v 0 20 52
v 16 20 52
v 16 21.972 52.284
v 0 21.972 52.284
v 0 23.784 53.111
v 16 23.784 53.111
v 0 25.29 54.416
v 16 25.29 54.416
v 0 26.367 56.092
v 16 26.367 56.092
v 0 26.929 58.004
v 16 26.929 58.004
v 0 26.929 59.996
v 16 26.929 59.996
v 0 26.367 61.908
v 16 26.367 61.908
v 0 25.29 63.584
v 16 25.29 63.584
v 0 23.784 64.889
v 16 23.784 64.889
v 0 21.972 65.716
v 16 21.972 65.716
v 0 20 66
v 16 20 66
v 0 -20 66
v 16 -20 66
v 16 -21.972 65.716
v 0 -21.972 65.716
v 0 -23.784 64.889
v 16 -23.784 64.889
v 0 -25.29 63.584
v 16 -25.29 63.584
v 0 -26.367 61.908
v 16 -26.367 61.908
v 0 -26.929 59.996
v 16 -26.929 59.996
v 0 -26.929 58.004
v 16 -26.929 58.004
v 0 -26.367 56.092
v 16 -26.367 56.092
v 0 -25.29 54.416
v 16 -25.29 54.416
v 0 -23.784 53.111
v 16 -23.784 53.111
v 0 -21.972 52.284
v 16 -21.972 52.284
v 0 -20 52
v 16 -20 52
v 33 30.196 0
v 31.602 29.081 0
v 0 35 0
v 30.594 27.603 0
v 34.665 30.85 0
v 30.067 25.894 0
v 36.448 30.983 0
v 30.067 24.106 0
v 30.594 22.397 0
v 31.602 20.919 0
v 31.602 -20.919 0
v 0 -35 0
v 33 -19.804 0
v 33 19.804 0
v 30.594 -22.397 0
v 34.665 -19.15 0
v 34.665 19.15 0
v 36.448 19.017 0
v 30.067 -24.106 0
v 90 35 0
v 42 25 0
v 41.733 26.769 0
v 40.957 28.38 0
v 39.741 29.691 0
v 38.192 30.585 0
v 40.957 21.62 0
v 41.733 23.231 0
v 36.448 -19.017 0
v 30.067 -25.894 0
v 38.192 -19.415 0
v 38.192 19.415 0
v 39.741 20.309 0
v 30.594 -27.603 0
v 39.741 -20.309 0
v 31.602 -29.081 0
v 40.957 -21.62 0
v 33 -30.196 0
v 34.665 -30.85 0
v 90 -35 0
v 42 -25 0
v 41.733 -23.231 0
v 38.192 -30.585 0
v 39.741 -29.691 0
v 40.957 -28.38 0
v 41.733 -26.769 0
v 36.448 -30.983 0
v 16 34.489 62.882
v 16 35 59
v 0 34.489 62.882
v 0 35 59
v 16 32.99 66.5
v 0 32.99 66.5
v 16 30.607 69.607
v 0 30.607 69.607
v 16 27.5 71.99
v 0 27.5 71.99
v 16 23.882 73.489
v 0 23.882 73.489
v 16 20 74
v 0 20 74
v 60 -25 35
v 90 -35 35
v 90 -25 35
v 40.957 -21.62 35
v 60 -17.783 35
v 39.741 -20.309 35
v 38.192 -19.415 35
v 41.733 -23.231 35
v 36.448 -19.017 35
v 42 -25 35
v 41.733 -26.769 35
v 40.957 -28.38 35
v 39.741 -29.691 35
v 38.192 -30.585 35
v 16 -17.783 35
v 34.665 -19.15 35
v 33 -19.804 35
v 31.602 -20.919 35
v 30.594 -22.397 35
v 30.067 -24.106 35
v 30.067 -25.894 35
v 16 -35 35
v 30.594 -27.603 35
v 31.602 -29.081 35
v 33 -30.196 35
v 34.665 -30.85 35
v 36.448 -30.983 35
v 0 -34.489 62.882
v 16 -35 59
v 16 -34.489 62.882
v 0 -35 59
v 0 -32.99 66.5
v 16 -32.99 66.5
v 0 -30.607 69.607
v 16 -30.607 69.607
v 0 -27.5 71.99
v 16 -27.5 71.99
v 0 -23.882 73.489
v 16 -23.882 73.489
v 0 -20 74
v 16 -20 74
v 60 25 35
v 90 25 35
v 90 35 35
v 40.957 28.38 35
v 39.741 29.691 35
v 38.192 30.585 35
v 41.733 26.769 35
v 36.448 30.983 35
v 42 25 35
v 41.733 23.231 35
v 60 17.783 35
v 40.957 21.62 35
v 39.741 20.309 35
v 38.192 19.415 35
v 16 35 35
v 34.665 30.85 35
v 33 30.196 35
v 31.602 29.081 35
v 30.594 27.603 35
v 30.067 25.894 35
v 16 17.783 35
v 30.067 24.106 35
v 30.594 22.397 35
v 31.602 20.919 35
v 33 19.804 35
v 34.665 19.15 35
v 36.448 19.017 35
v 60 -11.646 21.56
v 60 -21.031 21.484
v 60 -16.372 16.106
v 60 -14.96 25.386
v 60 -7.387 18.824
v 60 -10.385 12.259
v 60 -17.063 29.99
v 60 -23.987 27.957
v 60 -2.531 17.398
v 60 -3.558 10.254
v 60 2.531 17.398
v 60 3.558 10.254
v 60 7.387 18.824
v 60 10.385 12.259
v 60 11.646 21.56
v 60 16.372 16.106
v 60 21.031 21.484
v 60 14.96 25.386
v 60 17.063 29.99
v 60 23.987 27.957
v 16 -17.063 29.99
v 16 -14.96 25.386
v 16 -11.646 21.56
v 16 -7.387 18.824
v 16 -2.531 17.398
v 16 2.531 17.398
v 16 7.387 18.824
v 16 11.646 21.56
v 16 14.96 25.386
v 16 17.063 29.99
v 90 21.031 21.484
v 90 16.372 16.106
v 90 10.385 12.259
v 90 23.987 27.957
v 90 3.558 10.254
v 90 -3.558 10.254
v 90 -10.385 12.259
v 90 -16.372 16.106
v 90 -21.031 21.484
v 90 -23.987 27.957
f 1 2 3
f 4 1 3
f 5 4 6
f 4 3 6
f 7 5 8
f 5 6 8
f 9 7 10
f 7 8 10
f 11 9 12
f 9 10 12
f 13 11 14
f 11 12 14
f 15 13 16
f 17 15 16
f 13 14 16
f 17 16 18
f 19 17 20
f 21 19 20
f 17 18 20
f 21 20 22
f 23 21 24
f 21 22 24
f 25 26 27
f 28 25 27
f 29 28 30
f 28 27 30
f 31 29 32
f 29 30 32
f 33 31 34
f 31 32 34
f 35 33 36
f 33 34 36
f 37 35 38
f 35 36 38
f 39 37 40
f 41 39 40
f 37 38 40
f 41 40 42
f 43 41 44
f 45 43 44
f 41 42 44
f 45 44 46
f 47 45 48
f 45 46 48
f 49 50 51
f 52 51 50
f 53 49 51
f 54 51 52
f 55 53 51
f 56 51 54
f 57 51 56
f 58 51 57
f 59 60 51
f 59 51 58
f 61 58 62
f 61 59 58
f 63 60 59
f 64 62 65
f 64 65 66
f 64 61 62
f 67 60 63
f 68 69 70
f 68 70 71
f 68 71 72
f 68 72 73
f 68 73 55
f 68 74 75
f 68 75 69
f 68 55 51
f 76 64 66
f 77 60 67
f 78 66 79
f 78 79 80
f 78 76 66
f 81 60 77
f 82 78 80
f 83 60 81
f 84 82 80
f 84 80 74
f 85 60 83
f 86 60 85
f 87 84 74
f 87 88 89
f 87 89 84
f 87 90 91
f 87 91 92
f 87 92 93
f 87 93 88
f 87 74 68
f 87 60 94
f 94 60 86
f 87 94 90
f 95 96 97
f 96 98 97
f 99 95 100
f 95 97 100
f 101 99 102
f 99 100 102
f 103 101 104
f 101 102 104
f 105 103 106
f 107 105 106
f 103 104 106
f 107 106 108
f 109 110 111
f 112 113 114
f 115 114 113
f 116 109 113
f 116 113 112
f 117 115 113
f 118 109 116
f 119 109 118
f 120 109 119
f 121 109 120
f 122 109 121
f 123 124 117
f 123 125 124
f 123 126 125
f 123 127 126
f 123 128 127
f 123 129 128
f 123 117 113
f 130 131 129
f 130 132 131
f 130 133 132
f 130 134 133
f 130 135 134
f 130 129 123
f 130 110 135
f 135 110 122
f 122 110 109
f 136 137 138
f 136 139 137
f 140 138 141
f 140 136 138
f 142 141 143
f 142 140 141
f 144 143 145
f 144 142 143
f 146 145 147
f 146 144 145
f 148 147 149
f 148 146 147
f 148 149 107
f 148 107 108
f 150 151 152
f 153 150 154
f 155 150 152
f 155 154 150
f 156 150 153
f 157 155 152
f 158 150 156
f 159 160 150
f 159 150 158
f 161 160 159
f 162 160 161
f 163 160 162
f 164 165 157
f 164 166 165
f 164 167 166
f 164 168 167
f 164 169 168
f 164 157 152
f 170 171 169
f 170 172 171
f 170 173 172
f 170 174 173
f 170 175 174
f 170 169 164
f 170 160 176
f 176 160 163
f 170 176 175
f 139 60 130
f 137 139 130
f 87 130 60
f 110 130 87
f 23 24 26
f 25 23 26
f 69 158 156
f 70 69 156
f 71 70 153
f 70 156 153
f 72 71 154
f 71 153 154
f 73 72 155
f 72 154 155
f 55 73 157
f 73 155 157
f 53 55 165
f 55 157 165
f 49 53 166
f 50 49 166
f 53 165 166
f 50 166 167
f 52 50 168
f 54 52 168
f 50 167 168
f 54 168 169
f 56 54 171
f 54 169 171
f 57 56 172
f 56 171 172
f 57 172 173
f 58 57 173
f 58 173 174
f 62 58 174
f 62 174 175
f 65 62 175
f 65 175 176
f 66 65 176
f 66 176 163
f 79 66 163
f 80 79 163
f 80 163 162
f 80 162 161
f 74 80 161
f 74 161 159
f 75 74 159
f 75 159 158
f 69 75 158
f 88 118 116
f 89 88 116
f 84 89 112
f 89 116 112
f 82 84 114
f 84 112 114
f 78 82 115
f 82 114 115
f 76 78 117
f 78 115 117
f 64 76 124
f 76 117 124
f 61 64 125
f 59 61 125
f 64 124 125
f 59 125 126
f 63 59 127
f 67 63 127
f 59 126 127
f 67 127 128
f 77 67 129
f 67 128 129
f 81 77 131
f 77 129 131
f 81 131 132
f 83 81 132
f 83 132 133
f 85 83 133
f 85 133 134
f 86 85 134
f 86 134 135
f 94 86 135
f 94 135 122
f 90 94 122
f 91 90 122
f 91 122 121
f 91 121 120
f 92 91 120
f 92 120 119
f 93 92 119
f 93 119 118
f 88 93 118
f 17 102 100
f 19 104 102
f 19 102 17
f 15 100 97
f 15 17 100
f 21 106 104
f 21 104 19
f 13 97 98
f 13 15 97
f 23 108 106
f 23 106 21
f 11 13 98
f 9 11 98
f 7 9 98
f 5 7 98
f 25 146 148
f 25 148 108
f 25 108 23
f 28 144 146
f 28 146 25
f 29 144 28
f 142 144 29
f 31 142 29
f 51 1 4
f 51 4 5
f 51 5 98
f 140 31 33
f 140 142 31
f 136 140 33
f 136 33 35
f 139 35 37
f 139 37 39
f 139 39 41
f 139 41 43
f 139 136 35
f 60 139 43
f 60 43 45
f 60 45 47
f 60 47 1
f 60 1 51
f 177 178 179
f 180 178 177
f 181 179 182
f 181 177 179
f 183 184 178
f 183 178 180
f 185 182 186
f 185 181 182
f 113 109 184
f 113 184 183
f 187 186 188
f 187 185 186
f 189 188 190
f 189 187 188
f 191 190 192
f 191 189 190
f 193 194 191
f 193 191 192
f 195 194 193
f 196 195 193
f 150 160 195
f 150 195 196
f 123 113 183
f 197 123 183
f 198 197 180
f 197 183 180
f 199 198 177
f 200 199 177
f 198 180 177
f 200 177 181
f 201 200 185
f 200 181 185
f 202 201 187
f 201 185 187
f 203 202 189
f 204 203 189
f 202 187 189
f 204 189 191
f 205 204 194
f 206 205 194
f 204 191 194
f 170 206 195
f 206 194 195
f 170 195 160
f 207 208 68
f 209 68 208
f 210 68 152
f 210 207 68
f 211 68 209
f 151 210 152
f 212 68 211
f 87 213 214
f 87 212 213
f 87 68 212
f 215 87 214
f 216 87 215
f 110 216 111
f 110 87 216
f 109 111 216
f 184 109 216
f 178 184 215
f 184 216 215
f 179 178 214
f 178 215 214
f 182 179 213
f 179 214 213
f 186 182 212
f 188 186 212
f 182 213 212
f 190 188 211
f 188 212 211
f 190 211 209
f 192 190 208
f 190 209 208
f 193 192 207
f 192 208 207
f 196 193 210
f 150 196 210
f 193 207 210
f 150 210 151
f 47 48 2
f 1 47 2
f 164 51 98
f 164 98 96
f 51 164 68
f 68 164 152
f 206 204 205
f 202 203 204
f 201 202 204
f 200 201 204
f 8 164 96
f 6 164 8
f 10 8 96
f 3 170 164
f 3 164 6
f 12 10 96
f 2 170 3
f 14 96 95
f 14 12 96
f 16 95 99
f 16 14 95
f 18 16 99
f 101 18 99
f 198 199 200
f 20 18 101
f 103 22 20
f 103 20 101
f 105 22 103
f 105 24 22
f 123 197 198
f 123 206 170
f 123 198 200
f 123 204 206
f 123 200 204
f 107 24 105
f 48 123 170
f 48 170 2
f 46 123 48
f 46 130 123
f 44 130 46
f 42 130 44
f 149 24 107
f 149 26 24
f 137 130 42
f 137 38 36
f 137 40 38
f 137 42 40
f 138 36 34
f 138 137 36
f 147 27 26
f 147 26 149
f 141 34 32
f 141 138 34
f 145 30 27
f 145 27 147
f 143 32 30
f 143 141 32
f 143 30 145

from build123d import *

# Parameters (mm, degrees)
F1_DEPTH  = 35
F3_DEPTH  = 30
F5_DEPTH  = 44
F6_R      = 15
F8_DEPTH  = 16.001
F9_R      = 6
F10_DEPTH = 35.001


with BuildPart() as f1:
    # F0 (on Front) → F1 (new body, symmetric)
    with BuildSketch(Plane.XZ):
        Polygon((0, 74), (0, 0), (90, 0), (90, 35), (16, 35), (16, 74), align=None)
    extrude(amount=F1_DEPTH, both=True)

    # F2 (on face) → F3 (cut)
    with BuildSketch(Plane.YZ.offset(90)):
        with BuildLine():
            Line((25, 35), (-25, 35))
            ThreePointArc((-25, 35), (0, 10), (25, 35))
        make_face()
    extrude(amount=-F3_DEPTH, mode=Mode.SUBTRACT)

    # F4 (on face) → F5 (cut, through all)
    with BuildSketch(Plane.YZ.offset(60)):
        with BuildLine():
            Line((17.783249, 35), (-17.783249, 35))
            ThreePointArc((-17.783249, 35), (0, 17.216751), (17.783249, 35))
        make_face()
    extrude(amount=-F5_DEPTH, mode=Mode.SUBTRACT)

    # F6
    f6_edges = [f1.edges().sort_by_distance(p)[0] for p in [
        (8, -35, 74),
        (8, 35, 74),
    ]]
    fillet(f6_edges, radius=F6_R)

    # F7 (on face) → F8 (cut, through all)
    with BuildSketch(Plane.YZ.offset(16)):
        with BuildLine():
            ThreePointArc((-20, 66), (-27, 59), (-20, 52))
            Line((-20, 52), (20, 52))
            ThreePointArc((20, 52), (27, 59), (20, 66))
            Line((20, 66), (-20, 66))
        make_face()
    extrude(amount=-F8_DEPTH, mode=Mode.SUBTRACT)

    # F9 (on face) → F10 (cut, through all)
    with BuildSketch(Plane.XY.offset(35)):
        with Locations((36, -25)):
            Circle(F9_R)
        with Locations((36, 25)):
            Circle(F9_R)
    extrude(amount=-F10_DEPTH, mode=Mode.SUBTRACT)


solid = f1.part
